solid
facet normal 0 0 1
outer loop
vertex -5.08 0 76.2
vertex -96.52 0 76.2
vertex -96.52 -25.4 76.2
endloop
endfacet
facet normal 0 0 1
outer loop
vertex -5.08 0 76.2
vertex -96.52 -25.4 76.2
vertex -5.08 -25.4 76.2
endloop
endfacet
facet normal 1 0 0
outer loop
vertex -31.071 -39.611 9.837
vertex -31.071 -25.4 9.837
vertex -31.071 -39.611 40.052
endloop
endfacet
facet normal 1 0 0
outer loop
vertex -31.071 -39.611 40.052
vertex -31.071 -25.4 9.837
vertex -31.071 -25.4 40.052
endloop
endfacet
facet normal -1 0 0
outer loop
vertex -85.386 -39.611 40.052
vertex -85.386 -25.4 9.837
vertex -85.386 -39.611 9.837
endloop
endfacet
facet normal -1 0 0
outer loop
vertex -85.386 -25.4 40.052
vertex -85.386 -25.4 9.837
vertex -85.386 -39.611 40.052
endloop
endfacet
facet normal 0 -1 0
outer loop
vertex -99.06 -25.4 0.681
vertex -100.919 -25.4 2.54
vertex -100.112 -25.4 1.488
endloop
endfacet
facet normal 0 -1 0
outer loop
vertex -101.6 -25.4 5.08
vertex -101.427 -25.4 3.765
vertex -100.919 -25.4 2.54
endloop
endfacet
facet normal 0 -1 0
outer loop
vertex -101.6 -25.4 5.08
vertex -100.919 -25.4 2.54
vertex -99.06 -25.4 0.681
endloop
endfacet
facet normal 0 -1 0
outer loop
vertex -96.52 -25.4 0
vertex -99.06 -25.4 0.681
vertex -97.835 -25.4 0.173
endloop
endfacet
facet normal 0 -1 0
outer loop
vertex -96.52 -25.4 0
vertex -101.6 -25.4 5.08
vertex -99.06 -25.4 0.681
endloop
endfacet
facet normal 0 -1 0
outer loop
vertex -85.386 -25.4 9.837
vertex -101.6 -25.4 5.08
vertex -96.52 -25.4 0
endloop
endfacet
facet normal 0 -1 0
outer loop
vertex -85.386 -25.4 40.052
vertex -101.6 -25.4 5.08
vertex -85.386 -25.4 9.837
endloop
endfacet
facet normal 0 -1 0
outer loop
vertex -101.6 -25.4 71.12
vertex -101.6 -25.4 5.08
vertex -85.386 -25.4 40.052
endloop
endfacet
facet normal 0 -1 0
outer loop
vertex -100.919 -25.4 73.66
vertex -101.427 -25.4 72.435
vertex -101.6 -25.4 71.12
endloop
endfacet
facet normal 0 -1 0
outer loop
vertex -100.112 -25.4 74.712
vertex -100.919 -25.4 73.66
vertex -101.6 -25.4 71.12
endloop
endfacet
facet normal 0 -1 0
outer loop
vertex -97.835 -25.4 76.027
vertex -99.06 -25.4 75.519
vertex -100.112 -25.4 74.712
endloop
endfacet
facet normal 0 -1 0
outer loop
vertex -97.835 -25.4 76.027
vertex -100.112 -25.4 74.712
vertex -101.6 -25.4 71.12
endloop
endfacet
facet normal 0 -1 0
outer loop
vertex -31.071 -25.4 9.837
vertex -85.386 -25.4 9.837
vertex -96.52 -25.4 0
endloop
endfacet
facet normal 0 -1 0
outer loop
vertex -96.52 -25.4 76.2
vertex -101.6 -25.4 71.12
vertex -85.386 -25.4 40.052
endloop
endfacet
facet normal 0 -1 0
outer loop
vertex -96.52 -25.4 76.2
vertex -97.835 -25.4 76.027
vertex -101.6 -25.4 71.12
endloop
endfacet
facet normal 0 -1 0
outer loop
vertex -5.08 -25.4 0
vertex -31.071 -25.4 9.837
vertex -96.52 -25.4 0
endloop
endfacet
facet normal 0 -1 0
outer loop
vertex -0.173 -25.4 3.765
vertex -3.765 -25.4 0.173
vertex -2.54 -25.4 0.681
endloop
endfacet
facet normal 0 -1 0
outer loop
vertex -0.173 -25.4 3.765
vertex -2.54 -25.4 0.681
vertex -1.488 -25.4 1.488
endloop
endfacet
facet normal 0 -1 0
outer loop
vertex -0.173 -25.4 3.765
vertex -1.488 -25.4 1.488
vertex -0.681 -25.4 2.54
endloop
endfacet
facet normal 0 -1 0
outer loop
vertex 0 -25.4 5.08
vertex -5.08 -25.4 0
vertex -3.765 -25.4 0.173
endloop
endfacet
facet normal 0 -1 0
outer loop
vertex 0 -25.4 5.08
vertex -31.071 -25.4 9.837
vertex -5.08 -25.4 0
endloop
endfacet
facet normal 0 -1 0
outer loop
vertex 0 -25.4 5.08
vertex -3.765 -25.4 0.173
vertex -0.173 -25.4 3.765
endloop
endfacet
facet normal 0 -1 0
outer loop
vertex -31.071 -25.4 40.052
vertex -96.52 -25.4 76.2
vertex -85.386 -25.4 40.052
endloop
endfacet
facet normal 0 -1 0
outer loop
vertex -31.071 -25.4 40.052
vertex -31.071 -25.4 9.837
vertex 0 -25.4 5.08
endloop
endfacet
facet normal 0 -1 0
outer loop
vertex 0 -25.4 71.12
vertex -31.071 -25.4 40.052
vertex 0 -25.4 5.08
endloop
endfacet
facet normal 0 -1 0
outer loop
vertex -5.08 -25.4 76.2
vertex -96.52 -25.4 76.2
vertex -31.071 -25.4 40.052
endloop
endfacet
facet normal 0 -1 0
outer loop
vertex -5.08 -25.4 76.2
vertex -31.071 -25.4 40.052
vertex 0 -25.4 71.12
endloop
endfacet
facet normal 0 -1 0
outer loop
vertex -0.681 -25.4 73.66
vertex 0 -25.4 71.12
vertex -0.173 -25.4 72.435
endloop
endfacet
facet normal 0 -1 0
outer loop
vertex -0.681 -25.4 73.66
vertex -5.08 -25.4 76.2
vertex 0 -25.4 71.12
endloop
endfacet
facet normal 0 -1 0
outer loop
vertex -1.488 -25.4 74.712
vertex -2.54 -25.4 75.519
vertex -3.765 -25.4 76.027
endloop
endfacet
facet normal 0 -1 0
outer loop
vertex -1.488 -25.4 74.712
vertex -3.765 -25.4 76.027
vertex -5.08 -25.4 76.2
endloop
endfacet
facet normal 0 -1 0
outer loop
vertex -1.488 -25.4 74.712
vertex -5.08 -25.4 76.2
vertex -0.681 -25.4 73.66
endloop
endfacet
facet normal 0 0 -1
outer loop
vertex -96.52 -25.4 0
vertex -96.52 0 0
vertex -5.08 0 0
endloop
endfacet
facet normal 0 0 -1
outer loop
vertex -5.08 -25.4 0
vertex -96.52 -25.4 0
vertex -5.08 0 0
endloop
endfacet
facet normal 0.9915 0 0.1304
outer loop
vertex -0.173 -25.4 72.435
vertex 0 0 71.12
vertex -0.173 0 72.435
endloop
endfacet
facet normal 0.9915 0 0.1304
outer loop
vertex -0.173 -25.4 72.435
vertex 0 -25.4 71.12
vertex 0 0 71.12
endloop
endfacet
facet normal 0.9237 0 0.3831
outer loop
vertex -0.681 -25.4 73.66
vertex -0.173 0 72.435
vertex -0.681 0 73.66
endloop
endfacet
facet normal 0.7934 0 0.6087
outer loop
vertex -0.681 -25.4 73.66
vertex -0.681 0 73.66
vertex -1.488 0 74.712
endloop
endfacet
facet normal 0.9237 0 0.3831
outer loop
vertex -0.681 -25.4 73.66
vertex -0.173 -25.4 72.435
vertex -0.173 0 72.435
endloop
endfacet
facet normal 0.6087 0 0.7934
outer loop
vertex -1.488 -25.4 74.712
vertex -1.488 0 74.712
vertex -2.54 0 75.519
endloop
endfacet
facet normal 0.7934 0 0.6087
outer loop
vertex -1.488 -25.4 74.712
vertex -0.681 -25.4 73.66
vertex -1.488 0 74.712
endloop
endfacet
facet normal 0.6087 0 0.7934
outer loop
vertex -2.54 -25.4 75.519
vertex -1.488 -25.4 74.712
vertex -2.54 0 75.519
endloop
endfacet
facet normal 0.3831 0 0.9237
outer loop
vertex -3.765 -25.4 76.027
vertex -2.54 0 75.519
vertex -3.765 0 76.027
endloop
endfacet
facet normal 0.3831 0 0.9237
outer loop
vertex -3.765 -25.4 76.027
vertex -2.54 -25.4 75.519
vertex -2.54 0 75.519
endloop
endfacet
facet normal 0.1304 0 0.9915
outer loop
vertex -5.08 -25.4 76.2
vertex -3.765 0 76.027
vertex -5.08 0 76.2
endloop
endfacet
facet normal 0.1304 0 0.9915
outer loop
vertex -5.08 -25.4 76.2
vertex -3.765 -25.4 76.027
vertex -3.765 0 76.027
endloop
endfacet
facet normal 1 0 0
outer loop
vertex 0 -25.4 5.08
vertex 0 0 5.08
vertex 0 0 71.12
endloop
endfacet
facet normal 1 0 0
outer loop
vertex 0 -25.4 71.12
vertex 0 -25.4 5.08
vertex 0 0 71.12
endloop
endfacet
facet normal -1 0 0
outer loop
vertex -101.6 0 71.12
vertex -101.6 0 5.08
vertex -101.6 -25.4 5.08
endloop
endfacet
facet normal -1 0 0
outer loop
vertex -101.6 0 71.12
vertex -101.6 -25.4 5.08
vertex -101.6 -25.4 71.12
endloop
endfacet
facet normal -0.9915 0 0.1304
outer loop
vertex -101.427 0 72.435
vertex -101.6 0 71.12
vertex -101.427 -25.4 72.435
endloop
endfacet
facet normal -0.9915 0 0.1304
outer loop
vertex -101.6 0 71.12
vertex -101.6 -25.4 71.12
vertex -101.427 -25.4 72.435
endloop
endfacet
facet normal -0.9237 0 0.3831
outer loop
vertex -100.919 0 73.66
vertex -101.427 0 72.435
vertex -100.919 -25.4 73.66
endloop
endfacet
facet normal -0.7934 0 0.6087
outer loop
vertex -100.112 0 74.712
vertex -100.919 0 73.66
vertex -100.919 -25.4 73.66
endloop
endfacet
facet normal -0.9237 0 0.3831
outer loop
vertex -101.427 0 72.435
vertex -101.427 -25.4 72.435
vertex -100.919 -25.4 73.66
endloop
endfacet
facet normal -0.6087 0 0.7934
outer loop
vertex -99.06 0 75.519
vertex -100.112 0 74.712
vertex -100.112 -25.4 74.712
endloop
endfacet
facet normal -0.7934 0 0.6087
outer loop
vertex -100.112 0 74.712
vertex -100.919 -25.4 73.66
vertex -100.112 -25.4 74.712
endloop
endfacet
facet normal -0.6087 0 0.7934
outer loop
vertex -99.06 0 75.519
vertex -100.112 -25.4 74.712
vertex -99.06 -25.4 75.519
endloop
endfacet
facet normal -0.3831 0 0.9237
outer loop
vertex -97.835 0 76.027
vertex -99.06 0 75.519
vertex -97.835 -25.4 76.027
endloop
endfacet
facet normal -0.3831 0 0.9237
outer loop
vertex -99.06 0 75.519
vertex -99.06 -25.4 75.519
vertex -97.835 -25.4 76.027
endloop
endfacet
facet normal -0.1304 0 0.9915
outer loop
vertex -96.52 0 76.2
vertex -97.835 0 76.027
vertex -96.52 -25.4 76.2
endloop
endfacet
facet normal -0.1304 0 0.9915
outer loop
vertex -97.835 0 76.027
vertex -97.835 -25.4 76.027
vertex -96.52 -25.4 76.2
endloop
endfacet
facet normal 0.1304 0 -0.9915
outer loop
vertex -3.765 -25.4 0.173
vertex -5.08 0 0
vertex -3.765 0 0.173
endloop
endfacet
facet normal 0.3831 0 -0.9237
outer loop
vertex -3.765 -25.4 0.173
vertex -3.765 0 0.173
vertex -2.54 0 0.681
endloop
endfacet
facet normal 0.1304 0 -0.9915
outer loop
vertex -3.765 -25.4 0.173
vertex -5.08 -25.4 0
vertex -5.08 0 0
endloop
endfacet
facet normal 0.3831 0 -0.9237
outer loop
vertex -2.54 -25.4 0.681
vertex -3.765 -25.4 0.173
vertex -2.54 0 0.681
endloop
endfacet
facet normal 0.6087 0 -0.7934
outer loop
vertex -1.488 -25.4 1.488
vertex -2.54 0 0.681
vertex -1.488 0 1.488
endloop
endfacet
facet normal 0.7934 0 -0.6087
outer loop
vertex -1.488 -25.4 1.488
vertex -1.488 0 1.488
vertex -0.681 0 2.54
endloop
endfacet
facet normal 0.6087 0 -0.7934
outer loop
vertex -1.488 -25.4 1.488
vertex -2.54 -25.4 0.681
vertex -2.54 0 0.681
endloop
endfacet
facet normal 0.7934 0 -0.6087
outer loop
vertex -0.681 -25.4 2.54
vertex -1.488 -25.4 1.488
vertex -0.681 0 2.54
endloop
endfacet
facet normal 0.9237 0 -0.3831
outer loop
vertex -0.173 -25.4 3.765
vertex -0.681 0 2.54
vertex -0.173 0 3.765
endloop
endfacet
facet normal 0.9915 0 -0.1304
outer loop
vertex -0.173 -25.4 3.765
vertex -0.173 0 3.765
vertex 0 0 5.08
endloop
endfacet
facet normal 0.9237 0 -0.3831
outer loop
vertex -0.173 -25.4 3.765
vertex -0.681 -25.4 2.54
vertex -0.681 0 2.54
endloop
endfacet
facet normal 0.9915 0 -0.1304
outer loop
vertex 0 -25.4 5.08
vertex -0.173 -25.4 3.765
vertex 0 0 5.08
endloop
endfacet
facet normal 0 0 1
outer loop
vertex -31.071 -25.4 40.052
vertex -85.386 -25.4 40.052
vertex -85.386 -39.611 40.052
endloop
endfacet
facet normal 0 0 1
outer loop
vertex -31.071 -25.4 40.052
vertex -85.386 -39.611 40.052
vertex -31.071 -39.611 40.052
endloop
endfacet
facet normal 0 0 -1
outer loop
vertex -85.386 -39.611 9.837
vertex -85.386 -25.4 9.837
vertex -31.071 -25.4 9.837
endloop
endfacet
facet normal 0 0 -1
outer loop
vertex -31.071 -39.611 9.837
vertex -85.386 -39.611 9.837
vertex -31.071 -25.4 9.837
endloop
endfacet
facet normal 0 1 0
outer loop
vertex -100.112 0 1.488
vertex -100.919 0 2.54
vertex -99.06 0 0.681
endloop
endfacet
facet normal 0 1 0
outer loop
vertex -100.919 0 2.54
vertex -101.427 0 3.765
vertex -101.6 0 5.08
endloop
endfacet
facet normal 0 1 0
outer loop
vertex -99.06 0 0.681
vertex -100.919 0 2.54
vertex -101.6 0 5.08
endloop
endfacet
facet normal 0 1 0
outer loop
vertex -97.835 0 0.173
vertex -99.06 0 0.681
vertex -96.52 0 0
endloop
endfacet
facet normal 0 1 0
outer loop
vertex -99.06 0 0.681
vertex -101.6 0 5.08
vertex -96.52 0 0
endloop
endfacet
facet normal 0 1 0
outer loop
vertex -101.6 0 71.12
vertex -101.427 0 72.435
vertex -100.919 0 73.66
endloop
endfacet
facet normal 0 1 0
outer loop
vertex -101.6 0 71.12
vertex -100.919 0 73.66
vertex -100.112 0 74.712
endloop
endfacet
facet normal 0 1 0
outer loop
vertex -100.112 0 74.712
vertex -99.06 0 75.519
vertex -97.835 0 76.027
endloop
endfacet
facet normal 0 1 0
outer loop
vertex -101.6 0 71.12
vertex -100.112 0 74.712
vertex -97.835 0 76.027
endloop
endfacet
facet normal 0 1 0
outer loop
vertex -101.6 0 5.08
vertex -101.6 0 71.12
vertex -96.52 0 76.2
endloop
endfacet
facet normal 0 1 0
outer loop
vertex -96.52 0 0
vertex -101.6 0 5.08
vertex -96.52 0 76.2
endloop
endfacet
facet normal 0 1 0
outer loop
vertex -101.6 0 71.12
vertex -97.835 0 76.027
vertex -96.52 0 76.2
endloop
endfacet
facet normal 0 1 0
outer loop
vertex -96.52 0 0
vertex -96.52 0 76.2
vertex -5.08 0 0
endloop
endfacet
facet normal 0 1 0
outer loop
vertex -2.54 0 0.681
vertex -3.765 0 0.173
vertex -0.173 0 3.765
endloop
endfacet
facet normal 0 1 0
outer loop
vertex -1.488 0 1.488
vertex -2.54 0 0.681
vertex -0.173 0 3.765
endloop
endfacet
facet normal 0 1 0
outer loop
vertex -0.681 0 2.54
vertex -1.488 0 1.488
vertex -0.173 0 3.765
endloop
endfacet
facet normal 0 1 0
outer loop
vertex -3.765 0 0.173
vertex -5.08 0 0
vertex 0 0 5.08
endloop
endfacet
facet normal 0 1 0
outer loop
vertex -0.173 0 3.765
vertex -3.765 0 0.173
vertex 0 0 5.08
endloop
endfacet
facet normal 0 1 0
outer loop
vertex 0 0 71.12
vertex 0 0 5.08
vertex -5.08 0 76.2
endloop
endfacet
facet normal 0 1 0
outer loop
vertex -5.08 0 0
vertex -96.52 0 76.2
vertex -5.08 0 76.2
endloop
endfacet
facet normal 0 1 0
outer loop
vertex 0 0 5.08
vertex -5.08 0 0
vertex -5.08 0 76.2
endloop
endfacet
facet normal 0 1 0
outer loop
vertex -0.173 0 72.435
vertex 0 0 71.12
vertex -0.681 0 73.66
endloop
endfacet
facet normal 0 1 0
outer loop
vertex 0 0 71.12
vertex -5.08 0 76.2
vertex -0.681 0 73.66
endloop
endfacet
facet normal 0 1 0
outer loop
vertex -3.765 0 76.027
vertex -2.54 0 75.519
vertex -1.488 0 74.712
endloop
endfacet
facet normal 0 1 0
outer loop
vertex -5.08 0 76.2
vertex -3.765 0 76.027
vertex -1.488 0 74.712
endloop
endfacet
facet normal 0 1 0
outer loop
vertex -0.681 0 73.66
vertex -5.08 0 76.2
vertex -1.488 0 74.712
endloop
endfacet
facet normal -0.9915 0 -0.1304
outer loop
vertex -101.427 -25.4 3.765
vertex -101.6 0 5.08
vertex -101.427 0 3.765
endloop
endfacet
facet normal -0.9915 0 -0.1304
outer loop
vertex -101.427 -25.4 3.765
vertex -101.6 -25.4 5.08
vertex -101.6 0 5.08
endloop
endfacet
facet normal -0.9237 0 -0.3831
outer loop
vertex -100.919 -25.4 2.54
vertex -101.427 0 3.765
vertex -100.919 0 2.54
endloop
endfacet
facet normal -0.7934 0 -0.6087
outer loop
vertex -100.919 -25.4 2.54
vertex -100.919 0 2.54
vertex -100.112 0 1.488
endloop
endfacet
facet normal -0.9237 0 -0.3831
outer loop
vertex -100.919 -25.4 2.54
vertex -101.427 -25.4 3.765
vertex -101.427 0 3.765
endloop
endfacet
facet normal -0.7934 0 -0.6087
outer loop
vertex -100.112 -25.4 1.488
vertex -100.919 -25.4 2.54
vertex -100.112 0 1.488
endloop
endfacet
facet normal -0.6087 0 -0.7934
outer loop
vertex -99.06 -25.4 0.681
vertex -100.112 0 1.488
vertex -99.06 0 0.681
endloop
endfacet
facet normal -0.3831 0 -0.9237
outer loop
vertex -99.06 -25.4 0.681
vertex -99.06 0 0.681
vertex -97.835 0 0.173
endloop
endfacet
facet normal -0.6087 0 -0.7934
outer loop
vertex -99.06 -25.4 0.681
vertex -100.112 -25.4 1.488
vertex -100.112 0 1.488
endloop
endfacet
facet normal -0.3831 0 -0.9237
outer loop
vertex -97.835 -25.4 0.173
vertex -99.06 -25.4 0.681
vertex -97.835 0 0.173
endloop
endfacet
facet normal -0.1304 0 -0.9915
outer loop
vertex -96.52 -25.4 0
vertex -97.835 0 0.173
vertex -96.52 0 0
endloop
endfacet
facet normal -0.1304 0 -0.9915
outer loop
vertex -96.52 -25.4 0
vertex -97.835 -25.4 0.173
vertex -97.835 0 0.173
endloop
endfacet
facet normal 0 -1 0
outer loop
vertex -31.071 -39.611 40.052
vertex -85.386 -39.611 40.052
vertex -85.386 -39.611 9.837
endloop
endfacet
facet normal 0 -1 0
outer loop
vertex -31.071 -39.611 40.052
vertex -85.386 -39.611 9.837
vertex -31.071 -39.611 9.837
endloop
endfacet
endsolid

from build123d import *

# Parameters (mm, degrees)
F0_W     = 101.6
F0_H     = 76.2
F1_DEPTH = 25.4
F4_R     = 5.08
F5_W     = 54.3147437274
F5_H     = 30.2147697657
F6_DEPTH = 14.2107922584


# Not quite as in the source:
# - the program builds the solid bodies; features that only make, move or delete a surface that nothing else refers to are left out


with BuildPart() as f1:
    # F0 (on Front) → F1 (new body)
    with BuildSketch(Plane.XZ):
        with Locations((-50.8, 38.1)):
            Rectangle(F0_W, F0_H)
    extrude(amount=F1_DEPTH)

    # F4
    f4_edges = [f1.edges().sort_by_distance(p)[0] for p in [
        (-101.6, -12.7, 76.2),
        (0, -12.7, 76.2),
        (0, -12.7, 0),
        (-101.6, -12.7, 0),
    ]]
    fillet(f4_edges, radius=F4_R)

    # F5 (on face) → F6 (join)
    with BuildSketch(Plane.XZ.offset(25.4)):
        with Locations((-58.2285393029, 24.9443138018)):
            Rectangle(F5_W, F5_H)
    extrude(amount=F6_DEPTH)


solid = f1.part
